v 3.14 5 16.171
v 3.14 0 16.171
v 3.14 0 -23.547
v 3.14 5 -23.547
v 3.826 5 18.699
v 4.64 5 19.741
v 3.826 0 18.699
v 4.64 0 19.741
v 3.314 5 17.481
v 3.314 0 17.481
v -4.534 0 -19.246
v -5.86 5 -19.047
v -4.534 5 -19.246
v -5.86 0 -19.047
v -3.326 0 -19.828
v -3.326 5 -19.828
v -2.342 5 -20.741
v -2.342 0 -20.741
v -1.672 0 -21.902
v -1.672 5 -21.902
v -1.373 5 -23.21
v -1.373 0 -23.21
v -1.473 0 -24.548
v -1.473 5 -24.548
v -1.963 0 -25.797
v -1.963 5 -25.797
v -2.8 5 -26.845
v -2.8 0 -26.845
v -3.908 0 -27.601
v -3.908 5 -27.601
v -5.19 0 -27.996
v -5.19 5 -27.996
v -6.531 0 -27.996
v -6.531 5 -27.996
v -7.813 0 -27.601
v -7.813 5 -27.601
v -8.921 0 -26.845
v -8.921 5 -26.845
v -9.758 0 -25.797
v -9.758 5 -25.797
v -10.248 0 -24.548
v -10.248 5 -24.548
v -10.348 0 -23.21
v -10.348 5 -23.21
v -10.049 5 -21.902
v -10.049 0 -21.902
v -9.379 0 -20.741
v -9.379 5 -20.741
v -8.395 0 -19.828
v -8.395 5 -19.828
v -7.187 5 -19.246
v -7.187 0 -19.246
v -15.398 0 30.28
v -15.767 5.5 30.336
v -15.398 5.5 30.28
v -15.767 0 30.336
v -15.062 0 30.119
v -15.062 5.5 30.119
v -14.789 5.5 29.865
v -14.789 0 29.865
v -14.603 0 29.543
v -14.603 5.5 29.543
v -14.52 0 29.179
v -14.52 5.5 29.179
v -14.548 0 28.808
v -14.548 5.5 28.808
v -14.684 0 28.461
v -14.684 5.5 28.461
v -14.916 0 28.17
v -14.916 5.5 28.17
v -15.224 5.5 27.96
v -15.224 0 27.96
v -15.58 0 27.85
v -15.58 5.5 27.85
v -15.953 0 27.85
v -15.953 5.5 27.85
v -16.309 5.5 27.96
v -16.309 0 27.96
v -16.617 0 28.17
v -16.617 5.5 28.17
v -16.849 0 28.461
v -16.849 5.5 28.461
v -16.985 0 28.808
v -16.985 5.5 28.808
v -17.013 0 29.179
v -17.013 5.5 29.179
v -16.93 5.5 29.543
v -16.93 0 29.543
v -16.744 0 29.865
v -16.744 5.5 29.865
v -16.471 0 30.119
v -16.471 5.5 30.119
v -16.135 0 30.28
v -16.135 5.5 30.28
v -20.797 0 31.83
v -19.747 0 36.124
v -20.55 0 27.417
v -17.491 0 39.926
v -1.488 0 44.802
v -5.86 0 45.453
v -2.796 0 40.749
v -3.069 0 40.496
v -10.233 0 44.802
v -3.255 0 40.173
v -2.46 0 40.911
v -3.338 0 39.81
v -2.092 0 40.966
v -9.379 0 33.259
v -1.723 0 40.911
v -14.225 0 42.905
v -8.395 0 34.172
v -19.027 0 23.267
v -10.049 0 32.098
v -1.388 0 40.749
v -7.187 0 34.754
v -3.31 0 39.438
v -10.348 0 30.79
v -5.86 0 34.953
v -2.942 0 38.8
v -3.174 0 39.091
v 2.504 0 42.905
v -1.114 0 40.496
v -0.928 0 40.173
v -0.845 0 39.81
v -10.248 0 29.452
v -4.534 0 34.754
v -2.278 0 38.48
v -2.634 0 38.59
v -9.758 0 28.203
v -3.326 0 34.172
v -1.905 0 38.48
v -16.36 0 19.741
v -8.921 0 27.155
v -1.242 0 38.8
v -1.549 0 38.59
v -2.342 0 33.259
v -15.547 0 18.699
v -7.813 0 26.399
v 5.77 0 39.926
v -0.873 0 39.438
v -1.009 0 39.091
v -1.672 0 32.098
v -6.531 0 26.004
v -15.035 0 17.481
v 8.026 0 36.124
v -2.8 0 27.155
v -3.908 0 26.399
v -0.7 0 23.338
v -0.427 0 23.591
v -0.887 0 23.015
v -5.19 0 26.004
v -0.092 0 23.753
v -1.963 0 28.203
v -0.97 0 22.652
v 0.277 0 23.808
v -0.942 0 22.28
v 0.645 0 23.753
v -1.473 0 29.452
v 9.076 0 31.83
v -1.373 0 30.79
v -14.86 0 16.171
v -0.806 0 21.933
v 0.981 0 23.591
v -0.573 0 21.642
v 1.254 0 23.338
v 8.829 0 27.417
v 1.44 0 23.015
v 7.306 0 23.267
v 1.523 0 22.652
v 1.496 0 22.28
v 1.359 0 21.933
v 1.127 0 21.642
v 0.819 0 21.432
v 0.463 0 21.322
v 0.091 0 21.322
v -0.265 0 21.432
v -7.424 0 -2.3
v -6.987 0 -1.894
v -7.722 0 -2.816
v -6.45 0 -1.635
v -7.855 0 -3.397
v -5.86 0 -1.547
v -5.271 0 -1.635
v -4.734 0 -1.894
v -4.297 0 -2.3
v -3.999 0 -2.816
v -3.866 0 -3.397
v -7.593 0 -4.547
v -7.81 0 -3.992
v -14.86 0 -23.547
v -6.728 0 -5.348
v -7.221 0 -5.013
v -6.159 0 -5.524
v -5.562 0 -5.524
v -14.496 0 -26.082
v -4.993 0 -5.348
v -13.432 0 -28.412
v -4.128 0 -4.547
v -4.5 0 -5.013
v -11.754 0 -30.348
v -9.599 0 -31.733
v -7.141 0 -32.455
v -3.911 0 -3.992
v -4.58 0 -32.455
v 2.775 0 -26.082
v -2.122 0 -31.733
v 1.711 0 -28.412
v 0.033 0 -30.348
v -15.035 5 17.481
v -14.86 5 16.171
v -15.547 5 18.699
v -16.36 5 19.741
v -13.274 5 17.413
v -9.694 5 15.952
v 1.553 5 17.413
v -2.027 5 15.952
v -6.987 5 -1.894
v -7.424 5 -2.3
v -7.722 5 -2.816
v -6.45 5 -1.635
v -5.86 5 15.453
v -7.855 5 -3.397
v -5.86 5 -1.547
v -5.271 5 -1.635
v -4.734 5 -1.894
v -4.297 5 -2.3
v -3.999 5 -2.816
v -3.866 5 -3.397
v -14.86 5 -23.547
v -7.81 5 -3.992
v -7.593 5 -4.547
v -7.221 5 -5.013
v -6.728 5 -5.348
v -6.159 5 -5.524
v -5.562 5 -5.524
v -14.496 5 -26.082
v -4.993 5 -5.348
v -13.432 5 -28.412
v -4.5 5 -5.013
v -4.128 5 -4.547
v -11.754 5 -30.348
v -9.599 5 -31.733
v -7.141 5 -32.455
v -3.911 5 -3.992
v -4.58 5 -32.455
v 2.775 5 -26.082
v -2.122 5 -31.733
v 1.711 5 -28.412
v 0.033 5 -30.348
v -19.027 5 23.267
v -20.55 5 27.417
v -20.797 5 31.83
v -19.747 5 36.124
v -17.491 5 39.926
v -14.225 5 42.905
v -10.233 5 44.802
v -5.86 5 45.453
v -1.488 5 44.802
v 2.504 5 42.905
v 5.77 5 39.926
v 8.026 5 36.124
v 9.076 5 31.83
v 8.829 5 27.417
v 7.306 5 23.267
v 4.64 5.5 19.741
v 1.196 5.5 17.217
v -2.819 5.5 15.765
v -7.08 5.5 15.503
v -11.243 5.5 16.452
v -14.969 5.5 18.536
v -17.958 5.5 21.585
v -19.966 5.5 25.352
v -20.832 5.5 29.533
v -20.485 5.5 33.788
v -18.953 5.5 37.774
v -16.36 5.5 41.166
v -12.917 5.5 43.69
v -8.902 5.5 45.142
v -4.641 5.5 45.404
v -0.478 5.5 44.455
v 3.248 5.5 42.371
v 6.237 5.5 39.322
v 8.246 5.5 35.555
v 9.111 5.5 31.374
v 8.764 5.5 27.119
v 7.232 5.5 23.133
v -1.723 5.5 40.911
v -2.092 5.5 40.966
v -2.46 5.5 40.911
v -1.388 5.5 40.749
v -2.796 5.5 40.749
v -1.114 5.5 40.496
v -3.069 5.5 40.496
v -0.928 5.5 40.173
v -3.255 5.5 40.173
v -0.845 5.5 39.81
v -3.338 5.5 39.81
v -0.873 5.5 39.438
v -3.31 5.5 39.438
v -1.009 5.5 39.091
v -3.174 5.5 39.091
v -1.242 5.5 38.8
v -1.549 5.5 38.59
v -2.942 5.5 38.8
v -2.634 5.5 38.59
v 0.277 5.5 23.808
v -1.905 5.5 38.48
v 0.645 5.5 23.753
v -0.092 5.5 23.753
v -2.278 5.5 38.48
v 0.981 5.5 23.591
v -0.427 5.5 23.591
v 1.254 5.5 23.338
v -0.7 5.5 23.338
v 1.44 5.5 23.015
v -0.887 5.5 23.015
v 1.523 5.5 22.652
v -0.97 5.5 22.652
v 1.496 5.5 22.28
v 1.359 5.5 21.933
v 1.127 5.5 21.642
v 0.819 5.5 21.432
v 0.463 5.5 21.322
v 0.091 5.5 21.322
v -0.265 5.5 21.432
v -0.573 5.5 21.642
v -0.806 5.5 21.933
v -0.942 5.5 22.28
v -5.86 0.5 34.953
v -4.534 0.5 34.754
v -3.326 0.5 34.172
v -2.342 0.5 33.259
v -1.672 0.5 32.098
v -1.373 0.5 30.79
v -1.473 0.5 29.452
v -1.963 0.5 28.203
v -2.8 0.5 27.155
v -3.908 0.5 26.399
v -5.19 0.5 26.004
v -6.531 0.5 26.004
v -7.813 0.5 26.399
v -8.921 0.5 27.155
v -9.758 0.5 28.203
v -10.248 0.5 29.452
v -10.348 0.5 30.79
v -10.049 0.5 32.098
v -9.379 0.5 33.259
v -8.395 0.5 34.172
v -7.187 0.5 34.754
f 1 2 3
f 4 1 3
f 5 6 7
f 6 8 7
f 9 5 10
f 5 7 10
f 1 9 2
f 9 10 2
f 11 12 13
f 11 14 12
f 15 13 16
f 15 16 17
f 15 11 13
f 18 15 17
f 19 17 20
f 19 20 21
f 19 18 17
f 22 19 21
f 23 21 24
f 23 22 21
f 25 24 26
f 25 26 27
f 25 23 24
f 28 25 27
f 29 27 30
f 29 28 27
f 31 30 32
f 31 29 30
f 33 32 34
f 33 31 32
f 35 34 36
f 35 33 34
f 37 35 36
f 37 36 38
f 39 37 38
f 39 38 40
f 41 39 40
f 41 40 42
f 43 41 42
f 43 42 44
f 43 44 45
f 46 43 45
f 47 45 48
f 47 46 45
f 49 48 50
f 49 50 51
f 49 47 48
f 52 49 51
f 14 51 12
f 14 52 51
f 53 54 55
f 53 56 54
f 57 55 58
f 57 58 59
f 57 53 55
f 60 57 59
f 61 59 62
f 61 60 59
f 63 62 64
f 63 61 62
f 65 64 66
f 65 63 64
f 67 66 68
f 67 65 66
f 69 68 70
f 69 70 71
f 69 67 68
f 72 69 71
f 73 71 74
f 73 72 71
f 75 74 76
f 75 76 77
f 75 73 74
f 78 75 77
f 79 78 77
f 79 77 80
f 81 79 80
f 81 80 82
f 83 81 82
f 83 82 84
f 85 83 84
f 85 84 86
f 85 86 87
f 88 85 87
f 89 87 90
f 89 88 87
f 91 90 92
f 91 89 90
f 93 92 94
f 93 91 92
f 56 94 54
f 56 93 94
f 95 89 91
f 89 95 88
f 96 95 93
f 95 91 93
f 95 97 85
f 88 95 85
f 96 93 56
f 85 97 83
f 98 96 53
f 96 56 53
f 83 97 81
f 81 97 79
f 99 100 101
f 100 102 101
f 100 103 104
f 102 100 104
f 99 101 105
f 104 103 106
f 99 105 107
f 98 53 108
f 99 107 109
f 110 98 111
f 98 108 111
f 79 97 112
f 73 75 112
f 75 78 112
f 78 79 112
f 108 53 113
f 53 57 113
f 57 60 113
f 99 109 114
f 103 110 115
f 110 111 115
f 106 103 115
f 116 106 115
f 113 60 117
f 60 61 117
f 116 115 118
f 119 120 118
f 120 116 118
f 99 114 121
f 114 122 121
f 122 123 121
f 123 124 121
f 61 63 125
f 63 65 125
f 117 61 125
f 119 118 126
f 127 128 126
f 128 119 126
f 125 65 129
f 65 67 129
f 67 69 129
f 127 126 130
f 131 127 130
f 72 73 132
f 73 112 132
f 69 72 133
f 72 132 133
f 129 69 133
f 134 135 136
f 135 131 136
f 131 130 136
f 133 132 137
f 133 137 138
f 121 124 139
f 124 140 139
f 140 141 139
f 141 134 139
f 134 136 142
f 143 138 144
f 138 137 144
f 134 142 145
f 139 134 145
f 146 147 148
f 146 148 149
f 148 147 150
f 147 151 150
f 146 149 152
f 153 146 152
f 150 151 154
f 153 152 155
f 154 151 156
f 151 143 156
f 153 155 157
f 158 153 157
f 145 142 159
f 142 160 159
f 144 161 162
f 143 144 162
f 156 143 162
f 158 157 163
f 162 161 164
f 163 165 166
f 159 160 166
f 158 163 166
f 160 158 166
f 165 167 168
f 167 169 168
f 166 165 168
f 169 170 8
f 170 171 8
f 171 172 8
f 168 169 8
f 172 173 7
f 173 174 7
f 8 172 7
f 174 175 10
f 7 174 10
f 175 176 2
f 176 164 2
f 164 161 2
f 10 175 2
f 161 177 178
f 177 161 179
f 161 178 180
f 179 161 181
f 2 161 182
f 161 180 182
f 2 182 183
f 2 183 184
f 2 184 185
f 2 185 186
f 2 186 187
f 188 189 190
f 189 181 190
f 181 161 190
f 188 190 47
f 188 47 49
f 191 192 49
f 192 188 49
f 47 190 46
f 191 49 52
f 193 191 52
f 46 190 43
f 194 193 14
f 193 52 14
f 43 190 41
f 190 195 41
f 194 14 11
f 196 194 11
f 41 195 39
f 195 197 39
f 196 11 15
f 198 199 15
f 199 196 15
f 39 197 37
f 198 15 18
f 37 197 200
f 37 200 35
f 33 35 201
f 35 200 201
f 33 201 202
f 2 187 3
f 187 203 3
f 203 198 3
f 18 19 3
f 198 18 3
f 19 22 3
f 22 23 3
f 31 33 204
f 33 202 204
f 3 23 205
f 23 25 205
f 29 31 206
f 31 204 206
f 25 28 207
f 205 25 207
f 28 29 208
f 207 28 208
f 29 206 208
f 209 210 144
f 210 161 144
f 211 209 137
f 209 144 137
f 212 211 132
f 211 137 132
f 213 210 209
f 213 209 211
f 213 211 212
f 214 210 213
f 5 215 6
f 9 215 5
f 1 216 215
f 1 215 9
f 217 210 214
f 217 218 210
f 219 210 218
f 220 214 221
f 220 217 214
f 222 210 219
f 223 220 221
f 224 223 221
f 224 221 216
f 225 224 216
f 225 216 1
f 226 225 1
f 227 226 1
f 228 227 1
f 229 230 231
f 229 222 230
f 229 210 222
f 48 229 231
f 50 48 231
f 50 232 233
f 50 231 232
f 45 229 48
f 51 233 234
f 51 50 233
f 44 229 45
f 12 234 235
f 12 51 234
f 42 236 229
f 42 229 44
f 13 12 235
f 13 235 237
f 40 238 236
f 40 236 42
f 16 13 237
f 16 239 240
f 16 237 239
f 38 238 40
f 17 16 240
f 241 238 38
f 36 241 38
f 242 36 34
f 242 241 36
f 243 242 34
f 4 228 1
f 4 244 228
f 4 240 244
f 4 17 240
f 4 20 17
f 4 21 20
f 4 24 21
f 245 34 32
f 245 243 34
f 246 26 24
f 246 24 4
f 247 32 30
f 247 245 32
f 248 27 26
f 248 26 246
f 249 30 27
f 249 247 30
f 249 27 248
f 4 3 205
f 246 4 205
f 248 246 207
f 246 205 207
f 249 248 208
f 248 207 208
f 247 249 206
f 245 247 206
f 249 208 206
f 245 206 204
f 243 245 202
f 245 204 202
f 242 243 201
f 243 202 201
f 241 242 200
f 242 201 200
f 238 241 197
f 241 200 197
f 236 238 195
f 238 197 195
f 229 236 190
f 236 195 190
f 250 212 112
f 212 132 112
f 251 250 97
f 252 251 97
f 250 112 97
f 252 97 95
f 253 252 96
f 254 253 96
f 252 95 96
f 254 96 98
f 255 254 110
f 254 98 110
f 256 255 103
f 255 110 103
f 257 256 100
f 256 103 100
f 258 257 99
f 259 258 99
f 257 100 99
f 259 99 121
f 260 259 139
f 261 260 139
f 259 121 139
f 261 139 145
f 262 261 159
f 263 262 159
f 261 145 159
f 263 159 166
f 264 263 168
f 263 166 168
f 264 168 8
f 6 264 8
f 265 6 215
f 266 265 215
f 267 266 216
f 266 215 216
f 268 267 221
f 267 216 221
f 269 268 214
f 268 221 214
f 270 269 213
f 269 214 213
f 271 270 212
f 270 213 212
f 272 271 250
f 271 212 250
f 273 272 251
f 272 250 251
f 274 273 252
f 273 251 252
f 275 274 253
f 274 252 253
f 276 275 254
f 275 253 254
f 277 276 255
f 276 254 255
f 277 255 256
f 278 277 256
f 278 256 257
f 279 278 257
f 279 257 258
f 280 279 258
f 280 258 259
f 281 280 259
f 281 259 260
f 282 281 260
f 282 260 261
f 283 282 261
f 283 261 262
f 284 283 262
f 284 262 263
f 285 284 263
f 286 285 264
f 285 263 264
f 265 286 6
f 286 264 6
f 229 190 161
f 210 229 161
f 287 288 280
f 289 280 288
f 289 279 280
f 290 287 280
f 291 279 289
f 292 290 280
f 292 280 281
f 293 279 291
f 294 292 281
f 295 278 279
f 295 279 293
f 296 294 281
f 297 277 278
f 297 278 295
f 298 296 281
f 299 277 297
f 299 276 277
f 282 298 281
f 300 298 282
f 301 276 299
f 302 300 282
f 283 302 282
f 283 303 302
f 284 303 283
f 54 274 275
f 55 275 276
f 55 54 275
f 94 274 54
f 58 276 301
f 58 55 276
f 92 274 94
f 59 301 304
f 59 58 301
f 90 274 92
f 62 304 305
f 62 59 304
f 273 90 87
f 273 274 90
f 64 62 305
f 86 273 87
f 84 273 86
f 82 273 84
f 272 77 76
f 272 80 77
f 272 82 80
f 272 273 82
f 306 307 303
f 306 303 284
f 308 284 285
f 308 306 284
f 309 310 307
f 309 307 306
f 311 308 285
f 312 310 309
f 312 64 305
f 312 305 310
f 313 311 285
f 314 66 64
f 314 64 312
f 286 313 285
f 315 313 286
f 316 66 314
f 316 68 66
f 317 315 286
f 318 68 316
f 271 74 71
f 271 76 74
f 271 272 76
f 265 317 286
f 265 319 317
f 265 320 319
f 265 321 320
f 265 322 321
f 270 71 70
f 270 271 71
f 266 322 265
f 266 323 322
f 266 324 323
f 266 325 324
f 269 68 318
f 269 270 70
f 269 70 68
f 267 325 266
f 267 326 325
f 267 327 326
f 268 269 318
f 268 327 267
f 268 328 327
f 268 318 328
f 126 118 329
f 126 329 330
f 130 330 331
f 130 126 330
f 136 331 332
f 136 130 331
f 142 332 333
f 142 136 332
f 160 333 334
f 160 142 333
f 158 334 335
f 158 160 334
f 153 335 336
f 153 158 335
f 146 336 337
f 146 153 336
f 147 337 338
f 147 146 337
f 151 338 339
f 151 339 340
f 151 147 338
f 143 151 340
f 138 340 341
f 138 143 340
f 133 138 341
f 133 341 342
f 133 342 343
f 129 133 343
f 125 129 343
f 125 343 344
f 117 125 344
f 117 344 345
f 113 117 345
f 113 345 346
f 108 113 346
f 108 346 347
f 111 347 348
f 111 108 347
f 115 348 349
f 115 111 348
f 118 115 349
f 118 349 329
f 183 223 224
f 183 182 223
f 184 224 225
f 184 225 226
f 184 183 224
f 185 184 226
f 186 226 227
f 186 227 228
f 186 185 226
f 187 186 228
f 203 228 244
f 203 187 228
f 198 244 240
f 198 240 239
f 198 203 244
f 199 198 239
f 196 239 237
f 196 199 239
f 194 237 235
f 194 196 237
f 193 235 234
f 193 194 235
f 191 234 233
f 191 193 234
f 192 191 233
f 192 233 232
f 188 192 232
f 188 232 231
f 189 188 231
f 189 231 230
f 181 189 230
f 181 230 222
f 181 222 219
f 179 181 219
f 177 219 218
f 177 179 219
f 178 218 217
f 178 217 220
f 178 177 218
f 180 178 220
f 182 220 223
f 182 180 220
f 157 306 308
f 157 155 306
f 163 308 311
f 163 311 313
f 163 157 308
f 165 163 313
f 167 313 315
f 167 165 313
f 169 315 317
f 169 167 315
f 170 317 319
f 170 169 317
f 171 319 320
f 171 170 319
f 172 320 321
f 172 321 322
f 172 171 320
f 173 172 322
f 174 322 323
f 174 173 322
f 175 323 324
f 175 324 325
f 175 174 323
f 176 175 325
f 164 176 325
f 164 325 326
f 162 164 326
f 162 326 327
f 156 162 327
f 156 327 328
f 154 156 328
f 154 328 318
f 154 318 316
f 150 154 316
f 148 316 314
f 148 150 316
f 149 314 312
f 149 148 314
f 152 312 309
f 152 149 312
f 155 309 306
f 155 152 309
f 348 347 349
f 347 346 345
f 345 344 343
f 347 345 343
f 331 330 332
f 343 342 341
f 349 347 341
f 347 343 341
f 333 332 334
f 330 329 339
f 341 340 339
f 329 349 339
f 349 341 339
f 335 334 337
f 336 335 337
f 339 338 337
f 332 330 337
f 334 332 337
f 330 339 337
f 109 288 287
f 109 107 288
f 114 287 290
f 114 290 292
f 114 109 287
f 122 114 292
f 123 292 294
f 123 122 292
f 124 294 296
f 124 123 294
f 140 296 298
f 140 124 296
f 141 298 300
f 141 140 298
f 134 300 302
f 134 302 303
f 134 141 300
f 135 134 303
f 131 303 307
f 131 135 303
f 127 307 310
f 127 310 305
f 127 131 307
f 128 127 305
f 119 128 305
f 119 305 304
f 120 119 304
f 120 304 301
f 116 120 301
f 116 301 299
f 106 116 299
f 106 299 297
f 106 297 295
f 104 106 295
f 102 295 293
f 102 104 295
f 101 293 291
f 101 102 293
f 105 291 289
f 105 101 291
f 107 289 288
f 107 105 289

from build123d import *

# Parameters (mm, degrees)
SKETCH_1_R      = 4.5
SKETCH_1_R_2    = 2
SKETCH_1_R_3    = 1.25
EXTRUDE_2_DEPTH = 0.5
SKETCH_2_R      = 4.5
SKETCH_2_R_2    = 2
SKETCH_2_R_3    = 1.25
EXTRUDE_3_DEPTH = 4.5
SKETCH_3_R      = 15
SKETCH_3_R_2    = 1.25
EXTRUDE_4_DEPTH = 0.5


with BuildPart() as part:
    # 草图1 → 凸台-拉伸2 (new body)
    with BuildSketch(Plane(origin=(0, 0, 0), x_dir=(1, 0, 0), z_dir=(0, 1, 0))):
        with BuildLine():
            Line((-14.860465116, 23.546511628), (-14.860465116, -16.170631515))
            ThreePointArc((-14.860465116, -16.170631515), (-15.250692888, -18.107123188), (-16.360465116, -19.741345729))
            ThreePointArc((-16.360465116, -19.741345729), (-5.860465116, -45.453488372), (4.639534884, -19.741345729))
            ThreePointArc((4.639534884, -19.741345729), (3.529762655, -18.107123188), (3.139534884, -16.170631515))
            Line((3.139534884, -16.170631515), (3.139534884, 3.546511628))
            Line((3.139534884, 3.546511628), (3.139534884, 23.546511628))
            ThreePointArc((3.139534884, 23.546511628), (-5.860465116, 32.546511628), (-14.860465116, 23.546511628))
        make_face()
        with Locations(Location((-5.860465116, 23.546511628, 0), (0, 0, 270))):
            Circle(SKETCH_1_R, mode=Mode.SUBTRACT)
        with Locations(Location((-5.860465116, 3.546511628, 0), (0, 0, 270))):
            Circle(SKETCH_1_R_2, mode=Mode.SUBTRACT)
        with Locations(Location((-5.860465116, -30.453488372, 0), (0, 0, 270))):
            Circle(SKETCH_1_R, mode=Mode.SUBTRACT)
        with Locations(Location((-15.766516879, -29.085958307, 0), (0, 0, 270))):
            Circle(SKETCH_1_R_3, mode=Mode.SUBTRACT)
        with Locations(Location((-2.091755012, -39.716145882, 0), (0, 0, 270))):
            Circle(SKETCH_1_R_3, mode=Mode.SUBTRACT)
        with Locations(Location((0.276876542, -22.558360927, 0), (0, 0, 270))):
            Circle(SKETCH_1_R_3, mode=Mode.SUBTRACT)
    extrude(amount=EXTRUDE_2_DEPTH)

    # 草图2 → 凸台-拉伸3 (add)
    with BuildSketch(Plane(origin=(0, 0.5, 0), x_dir=(1, 0, 0), z_dir=(0, 1, 0))):
        with BuildLine():
            Line((-14.860465116, 23.546511628), (-14.860465116, -16.170631515))
            ThreePointArc((-14.860465116, -16.170631515), (-15.250692888, -18.107123188), (-16.360465116, -19.741345729))
            ThreePointArc((-16.360465116, -19.741345729), (-5.860465116, -45.453488372), (4.639534884, -19.741345729))
            ThreePointArc((4.639534884, -19.741345729), (3.529762655, -18.107123188), (3.139534884, -16.170631515))
            Line((3.139534884, -16.170631515), (3.139534884, 23.546511628))
            ThreePointArc((3.139534884, 23.546511628), (-5.860465116, 32.546511628), (-14.860465116, 23.546511628))
        make_face()
        with Locations(Location((-5.860465116, 23.546511628, 0), (0, 0, 270))):
            Circle(SKETCH_2_R, mode=Mode.SUBTRACT)
        with Locations(Location((-5.860465116, 3.546511628, 0), (0, 0, 270))):
            Circle(SKETCH_2_R_2, mode=Mode.SUBTRACT)
        with Locations(Location((-15.766516879, -29.085958307, 0), (0, 0, 270))):
            Circle(SKETCH_2_R_3, mode=Mode.SUBTRACT)
        with Locations(Location((-2.091755012, -39.716145882, 0), (0, 0, 270))):
            Circle(SKETCH_2_R_3, mode=Mode.SUBTRACT)
        with Locations(Location((0.276876542, -22.558360927, 0), (0, 0, 270))):
            Circle(SKETCH_2_R_3, mode=Mode.SUBTRACT)
    extrude(amount=EXTRUDE_3_DEPTH)

    # 草图3 → 凸台-拉伸4 (add)
    with BuildSketch(Plane(origin=(0, 5, 0), x_dir=(1, 0, 0), z_dir=(0, 1, 0))):
        with Locations(Location((-5.860465116, -30.453488372, 0), (0, 0, 45.572995999))):
            Circle(SKETCH_3_R)
        with Locations(Location((-15.766516879, -29.085958307, 0), (0, 0, 270))):
            Circle(SKETCH_3_R_2, mode=Mode.SUBTRACT)
        with Locations(Location((0.276876542, -22.558360927, 0), (0, 0, 270))):
            Circle(SKETCH_3_R_2, mode=Mode.SUBTRACT)
        with Locations(Location((-2.091755012, -39.716145882, 0), (0, 0, 270))):
            Circle(SKETCH_3_R_2, mode=Mode.SUBTRACT)
    extrude(amount=EXTRUDE_4_DEPTH)


solid = part.part
